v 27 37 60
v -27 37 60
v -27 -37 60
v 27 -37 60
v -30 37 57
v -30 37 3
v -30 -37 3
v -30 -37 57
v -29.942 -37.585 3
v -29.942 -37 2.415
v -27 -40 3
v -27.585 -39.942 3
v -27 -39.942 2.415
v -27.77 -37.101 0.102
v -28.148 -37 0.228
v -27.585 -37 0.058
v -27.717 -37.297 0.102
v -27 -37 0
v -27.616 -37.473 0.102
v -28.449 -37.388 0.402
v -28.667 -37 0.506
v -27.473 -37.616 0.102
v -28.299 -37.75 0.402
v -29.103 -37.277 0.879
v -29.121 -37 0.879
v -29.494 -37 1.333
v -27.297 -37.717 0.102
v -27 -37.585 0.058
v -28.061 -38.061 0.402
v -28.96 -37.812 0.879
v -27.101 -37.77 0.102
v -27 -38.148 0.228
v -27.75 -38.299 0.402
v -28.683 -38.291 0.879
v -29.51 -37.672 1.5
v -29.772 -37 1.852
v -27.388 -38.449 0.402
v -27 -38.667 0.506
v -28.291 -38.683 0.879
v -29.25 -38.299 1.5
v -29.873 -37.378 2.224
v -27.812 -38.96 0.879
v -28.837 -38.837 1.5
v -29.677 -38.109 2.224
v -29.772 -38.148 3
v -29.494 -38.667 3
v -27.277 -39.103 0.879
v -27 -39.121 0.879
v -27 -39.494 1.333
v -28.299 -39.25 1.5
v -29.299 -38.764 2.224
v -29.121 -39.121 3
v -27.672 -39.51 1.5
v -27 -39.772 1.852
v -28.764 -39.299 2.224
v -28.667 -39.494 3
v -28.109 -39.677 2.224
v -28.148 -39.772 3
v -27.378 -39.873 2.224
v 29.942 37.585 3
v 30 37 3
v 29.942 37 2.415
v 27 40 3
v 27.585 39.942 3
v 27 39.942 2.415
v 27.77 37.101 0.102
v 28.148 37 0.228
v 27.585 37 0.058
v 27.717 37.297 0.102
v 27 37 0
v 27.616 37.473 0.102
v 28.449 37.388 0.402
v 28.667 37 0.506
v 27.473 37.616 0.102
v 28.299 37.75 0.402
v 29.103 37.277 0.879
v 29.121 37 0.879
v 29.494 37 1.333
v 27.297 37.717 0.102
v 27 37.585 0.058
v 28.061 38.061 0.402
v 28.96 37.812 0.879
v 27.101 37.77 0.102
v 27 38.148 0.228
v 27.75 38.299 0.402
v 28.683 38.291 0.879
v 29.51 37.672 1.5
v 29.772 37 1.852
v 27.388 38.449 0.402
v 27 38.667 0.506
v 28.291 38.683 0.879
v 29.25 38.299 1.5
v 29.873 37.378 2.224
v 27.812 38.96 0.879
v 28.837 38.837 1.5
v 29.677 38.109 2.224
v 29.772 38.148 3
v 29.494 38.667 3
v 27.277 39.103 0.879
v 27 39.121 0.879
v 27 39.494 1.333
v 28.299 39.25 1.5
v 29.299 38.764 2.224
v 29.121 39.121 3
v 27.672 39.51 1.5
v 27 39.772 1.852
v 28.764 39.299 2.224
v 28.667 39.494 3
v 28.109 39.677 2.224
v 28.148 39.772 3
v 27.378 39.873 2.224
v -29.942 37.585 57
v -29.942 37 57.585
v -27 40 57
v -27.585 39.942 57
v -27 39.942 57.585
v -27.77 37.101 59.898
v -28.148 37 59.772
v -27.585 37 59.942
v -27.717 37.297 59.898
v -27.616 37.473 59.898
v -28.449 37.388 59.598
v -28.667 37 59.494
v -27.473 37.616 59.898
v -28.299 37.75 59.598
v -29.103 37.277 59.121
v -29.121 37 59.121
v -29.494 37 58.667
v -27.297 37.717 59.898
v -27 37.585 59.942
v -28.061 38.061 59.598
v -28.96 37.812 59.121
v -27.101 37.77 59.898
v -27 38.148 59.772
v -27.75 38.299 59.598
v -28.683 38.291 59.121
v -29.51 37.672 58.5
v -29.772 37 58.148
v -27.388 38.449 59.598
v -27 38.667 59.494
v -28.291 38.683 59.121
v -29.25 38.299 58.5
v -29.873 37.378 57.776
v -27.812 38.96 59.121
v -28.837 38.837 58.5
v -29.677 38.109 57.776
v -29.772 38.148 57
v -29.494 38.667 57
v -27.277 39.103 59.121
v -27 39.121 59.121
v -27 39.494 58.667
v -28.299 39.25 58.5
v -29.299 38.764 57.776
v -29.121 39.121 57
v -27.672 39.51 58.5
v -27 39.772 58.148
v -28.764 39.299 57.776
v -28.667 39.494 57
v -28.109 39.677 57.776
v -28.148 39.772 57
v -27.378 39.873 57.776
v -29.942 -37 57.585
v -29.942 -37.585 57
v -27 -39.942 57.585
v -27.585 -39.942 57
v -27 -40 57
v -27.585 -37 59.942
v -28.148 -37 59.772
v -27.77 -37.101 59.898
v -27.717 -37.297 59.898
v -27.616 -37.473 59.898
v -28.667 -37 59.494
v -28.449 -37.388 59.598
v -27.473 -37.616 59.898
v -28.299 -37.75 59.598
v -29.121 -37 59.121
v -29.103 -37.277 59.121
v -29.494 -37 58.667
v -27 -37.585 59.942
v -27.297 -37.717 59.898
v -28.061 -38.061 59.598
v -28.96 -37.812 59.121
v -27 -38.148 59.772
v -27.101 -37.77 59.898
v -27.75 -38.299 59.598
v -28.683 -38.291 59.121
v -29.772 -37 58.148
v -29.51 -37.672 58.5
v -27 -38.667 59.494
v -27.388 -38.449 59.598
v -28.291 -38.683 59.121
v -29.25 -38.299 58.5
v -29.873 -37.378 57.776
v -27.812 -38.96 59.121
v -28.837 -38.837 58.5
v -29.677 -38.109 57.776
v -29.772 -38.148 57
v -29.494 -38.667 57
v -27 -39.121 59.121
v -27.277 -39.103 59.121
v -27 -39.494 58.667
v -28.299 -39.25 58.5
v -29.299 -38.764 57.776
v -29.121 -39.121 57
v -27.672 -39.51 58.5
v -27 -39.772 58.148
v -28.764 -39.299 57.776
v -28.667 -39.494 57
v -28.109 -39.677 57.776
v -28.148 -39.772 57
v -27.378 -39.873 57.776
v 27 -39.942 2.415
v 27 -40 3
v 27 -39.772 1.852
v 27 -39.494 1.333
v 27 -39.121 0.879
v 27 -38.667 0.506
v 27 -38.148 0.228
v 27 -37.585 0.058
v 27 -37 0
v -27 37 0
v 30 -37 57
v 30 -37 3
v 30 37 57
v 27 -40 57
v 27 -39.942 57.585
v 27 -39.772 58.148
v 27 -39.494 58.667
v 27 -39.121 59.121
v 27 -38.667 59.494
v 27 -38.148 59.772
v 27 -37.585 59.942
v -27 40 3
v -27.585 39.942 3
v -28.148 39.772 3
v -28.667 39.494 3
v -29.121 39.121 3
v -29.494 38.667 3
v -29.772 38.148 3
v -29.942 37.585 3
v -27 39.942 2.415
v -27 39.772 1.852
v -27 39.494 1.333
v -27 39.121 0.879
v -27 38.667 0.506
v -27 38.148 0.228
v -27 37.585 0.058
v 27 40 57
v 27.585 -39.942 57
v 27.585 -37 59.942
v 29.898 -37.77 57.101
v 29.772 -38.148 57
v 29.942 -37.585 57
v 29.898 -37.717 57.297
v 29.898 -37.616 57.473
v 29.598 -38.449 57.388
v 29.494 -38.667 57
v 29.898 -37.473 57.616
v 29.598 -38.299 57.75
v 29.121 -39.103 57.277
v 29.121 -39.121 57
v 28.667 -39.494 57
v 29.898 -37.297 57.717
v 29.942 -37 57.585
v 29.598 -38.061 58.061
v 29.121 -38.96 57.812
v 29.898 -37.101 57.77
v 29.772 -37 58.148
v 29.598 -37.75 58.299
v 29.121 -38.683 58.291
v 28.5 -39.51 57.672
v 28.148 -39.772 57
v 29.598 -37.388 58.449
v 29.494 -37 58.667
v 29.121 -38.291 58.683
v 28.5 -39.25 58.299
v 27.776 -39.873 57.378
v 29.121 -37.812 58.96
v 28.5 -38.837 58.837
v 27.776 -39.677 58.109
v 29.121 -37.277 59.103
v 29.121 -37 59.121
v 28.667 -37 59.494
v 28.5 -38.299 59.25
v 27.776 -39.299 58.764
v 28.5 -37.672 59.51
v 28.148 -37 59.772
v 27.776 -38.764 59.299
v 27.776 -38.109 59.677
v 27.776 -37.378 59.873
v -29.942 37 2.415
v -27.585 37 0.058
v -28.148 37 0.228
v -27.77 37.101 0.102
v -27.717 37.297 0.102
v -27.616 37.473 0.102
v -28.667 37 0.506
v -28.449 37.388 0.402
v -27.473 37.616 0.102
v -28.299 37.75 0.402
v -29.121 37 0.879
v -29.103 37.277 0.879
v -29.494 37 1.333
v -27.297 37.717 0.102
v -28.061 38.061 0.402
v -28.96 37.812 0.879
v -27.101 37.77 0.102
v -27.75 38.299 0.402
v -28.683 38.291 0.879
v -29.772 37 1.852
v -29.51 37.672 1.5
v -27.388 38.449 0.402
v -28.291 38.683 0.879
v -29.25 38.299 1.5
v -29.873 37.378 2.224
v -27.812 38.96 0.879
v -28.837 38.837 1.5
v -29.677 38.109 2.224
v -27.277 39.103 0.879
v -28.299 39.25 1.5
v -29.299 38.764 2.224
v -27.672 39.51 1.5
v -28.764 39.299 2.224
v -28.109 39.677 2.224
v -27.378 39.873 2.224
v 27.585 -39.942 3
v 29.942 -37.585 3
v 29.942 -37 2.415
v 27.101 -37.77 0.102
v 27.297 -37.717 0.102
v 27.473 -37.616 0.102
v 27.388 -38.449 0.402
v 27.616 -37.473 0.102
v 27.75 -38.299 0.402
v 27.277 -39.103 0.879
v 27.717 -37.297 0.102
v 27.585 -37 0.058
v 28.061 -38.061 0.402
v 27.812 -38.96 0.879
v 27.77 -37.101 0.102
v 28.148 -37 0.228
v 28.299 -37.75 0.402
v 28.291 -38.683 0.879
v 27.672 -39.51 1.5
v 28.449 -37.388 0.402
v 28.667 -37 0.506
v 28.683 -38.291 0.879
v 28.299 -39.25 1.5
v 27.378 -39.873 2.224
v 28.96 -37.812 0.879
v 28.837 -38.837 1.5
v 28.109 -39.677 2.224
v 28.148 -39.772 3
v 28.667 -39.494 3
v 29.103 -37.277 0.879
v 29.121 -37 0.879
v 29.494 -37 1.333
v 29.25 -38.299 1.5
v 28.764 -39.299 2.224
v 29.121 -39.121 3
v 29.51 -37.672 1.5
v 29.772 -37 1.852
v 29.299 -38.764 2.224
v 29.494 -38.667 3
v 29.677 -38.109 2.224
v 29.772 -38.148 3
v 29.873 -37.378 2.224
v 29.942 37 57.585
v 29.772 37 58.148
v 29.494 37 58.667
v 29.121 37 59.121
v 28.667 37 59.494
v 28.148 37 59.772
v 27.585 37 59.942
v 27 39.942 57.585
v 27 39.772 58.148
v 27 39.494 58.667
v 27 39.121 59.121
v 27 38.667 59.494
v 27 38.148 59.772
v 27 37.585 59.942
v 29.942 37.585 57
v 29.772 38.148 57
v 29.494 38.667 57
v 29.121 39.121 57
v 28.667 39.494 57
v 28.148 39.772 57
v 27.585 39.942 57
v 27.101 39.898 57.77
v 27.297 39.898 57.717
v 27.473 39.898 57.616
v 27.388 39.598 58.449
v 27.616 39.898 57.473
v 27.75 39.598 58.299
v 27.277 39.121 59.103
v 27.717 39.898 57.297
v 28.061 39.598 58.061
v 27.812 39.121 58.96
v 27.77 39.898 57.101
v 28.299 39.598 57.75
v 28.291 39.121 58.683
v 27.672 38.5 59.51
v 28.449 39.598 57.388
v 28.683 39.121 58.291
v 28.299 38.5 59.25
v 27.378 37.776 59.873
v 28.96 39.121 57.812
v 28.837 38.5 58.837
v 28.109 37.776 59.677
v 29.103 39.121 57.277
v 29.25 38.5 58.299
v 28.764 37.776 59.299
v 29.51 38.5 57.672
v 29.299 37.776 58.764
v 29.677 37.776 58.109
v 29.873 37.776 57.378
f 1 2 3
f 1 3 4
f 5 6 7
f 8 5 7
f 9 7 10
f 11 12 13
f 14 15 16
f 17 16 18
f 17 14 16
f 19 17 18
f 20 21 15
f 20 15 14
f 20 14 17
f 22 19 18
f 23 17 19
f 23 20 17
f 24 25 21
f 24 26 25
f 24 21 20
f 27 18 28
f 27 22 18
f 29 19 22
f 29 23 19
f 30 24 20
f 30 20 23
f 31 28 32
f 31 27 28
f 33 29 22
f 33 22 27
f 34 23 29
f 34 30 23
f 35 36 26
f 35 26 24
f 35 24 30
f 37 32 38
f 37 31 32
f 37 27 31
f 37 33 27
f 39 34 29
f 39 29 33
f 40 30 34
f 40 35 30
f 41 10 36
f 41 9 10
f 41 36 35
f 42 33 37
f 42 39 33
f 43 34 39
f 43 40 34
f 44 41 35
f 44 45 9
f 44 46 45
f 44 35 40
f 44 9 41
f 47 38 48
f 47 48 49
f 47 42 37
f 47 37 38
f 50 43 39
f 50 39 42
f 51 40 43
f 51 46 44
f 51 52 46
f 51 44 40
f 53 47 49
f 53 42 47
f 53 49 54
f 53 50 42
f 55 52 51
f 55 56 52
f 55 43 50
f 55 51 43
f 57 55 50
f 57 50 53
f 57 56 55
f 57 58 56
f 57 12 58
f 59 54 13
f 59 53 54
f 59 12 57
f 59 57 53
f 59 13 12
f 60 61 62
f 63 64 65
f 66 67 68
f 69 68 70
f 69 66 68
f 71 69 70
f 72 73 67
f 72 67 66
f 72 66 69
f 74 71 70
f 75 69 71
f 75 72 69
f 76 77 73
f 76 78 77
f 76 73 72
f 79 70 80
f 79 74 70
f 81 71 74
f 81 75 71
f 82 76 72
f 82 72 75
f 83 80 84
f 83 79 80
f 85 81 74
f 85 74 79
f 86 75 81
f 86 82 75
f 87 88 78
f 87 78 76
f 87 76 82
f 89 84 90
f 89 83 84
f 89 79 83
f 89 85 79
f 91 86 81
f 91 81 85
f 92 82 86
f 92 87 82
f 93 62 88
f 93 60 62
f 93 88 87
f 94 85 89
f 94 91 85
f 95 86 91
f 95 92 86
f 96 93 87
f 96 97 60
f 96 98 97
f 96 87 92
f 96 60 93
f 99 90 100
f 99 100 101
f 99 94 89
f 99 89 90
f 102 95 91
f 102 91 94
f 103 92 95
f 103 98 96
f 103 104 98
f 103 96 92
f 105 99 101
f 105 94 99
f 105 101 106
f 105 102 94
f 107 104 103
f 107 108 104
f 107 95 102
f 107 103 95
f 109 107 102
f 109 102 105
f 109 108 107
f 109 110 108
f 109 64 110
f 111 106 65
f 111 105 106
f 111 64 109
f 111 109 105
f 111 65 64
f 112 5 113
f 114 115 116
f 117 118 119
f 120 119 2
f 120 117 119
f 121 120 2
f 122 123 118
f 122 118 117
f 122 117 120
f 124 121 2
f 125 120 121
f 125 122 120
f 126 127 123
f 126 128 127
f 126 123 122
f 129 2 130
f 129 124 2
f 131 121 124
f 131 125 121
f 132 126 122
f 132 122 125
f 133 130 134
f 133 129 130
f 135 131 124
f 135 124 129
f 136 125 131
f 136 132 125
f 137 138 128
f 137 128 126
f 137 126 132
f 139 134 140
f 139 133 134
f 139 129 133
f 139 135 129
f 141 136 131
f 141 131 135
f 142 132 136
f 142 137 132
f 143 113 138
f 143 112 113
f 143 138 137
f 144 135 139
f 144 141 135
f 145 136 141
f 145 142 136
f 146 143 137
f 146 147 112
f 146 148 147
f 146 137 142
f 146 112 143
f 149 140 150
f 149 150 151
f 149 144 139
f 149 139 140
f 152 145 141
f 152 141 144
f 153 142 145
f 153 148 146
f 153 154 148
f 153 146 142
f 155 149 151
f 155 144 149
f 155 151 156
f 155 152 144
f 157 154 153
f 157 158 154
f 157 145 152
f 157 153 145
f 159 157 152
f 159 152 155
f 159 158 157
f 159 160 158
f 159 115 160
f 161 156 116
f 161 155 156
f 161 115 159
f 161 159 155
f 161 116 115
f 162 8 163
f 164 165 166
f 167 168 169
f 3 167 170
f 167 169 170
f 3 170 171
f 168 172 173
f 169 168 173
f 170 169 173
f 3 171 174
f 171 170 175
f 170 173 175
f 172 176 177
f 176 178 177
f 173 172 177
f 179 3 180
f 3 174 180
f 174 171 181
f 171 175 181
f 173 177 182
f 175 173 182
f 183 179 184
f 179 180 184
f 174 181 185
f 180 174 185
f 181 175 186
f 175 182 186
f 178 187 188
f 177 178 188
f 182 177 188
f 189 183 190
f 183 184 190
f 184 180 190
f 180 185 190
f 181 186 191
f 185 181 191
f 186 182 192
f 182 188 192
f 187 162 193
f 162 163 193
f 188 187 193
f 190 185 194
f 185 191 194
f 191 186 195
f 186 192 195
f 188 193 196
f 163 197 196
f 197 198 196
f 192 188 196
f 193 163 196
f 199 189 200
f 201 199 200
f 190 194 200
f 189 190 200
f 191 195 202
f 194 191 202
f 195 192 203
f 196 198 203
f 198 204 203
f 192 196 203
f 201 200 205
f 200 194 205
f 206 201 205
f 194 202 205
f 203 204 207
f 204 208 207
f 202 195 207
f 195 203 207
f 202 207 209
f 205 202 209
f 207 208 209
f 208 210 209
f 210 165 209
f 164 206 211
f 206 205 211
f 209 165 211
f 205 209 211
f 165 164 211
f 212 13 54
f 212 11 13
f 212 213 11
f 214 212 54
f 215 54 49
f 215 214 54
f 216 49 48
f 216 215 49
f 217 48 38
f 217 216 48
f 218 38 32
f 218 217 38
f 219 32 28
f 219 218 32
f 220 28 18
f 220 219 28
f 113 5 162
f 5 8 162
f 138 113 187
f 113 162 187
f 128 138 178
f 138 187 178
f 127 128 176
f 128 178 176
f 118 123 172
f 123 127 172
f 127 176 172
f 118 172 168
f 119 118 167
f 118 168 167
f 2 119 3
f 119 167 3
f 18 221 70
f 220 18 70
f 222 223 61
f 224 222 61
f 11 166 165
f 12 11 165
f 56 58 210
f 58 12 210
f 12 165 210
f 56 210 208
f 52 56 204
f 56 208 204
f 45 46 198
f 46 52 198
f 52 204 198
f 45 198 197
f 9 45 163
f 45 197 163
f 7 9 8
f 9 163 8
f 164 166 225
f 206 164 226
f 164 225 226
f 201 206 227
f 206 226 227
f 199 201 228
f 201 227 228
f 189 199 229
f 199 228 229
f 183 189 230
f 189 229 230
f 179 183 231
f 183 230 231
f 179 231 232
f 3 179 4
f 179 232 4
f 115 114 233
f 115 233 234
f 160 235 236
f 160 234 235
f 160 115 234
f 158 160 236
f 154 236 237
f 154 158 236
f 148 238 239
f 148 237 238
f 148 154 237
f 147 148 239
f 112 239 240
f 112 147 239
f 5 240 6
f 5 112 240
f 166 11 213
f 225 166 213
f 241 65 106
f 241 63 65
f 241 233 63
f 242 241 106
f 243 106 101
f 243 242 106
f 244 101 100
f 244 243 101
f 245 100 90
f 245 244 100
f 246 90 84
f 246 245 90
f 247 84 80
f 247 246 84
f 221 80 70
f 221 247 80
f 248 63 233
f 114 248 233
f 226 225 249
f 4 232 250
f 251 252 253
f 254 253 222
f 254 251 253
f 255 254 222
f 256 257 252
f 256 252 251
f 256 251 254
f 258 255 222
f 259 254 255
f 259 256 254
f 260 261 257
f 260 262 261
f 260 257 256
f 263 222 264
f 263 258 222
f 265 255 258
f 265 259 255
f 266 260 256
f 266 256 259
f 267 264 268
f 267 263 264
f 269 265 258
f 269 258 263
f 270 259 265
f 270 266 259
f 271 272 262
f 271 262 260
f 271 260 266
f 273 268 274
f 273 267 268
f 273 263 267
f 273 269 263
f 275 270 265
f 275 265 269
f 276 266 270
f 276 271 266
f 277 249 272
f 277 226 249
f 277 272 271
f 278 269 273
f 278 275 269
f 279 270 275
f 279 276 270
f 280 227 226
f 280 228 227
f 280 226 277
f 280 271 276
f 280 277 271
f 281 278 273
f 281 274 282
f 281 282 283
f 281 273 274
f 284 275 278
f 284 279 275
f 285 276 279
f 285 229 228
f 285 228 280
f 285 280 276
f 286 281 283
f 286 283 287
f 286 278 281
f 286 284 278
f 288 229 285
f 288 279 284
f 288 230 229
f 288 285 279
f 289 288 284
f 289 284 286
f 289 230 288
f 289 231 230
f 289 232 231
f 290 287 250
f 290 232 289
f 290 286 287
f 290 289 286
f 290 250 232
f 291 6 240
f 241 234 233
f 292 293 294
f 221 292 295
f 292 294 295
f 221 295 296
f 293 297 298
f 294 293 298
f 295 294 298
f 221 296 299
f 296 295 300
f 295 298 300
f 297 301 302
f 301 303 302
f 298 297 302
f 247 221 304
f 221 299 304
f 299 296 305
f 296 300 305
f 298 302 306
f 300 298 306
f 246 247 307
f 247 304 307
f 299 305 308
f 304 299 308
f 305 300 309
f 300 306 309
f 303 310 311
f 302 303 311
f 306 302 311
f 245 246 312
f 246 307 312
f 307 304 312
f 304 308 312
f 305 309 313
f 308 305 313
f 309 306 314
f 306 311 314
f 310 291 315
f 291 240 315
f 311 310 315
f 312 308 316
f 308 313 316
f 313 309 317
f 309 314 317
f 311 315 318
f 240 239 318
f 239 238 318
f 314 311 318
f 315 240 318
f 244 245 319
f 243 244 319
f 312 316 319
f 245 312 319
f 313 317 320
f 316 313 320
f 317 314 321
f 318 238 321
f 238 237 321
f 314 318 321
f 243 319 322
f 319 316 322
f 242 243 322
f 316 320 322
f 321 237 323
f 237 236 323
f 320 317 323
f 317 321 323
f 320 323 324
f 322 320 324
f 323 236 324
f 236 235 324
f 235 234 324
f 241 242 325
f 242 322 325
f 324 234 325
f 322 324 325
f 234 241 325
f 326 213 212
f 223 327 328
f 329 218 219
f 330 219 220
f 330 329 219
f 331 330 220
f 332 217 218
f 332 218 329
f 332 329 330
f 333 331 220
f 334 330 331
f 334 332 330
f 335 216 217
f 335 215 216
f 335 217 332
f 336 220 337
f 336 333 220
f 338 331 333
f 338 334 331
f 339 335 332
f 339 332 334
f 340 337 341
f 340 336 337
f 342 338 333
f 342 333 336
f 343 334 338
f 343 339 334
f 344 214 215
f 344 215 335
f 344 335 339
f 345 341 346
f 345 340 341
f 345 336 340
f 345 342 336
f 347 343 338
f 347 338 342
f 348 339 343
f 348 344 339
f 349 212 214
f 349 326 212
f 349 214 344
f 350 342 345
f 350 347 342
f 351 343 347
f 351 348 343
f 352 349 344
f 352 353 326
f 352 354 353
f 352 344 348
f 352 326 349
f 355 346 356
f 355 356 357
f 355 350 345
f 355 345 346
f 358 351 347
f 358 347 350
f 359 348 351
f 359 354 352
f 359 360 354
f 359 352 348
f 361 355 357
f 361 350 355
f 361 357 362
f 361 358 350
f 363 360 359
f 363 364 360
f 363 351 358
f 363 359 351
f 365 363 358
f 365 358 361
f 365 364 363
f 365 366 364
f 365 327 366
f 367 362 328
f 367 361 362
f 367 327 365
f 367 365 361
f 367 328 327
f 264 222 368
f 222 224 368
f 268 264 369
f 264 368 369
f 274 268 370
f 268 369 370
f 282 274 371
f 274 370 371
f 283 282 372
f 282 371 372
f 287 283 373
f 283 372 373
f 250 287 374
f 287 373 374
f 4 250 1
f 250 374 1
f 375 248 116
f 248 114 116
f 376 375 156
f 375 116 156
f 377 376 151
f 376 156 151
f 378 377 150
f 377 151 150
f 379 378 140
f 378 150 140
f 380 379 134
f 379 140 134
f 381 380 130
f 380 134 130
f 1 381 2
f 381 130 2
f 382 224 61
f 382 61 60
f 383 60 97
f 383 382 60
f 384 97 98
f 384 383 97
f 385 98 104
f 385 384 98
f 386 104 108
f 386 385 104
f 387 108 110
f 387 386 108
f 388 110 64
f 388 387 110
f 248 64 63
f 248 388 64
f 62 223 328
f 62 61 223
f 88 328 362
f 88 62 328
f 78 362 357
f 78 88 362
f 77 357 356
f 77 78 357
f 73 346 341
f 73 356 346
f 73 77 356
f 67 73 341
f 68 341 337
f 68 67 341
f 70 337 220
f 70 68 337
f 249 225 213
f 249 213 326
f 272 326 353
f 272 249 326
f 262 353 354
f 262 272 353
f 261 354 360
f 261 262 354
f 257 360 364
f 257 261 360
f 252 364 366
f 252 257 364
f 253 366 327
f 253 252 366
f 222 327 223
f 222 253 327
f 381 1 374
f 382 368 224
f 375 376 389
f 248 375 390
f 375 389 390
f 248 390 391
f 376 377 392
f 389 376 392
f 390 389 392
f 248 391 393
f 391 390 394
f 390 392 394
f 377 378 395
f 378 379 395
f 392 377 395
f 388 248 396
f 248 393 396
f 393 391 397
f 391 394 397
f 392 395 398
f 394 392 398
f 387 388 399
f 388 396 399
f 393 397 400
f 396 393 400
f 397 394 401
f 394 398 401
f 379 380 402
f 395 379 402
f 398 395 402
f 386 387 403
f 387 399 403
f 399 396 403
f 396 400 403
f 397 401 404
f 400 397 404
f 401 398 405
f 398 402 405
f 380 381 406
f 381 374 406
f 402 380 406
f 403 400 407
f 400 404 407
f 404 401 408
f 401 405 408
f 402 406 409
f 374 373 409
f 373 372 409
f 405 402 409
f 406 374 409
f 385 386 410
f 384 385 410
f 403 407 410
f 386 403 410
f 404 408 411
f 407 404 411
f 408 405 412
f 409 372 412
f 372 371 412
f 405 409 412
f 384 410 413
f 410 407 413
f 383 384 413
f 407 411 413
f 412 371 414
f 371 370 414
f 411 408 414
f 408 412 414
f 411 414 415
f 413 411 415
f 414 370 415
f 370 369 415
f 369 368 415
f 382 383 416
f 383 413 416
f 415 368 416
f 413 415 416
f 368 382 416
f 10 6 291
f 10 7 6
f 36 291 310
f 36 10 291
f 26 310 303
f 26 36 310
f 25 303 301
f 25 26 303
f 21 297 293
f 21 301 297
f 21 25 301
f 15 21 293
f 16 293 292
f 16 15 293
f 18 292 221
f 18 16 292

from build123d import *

# Parameters (mm, degrees)
F1_DEPTH = 60
F2_R     = 3


with BuildPart() as f1:
    # F0 (on Top) → F1 (new body)
    with BuildSketch(Plane.XY):
        Polygon((-30, -40), (0, -40), (30, -40), (30, 40), (-30, 40), align=None)
    extrude(amount=F1_DEPTH)

    # F2
    f2_edges = [f1.edges().sort_by_distance(p)[0] for p in [
        (-30, 40, 30),
        (-30, -40, 30),
        (-30, 0, 0),
        (-30, 0, 60),
        (0, -40, 60),
        (30, -40, 30),
        (0, -40, 0),
        (30, 0, 60),
        (0, 40, 60),
        (30, 40, 30),
        (30, 0, 0),
        (0, 40, 0),
    ]]
    fillet(f2_edges, radius=F2_R)


solid = f1.part
